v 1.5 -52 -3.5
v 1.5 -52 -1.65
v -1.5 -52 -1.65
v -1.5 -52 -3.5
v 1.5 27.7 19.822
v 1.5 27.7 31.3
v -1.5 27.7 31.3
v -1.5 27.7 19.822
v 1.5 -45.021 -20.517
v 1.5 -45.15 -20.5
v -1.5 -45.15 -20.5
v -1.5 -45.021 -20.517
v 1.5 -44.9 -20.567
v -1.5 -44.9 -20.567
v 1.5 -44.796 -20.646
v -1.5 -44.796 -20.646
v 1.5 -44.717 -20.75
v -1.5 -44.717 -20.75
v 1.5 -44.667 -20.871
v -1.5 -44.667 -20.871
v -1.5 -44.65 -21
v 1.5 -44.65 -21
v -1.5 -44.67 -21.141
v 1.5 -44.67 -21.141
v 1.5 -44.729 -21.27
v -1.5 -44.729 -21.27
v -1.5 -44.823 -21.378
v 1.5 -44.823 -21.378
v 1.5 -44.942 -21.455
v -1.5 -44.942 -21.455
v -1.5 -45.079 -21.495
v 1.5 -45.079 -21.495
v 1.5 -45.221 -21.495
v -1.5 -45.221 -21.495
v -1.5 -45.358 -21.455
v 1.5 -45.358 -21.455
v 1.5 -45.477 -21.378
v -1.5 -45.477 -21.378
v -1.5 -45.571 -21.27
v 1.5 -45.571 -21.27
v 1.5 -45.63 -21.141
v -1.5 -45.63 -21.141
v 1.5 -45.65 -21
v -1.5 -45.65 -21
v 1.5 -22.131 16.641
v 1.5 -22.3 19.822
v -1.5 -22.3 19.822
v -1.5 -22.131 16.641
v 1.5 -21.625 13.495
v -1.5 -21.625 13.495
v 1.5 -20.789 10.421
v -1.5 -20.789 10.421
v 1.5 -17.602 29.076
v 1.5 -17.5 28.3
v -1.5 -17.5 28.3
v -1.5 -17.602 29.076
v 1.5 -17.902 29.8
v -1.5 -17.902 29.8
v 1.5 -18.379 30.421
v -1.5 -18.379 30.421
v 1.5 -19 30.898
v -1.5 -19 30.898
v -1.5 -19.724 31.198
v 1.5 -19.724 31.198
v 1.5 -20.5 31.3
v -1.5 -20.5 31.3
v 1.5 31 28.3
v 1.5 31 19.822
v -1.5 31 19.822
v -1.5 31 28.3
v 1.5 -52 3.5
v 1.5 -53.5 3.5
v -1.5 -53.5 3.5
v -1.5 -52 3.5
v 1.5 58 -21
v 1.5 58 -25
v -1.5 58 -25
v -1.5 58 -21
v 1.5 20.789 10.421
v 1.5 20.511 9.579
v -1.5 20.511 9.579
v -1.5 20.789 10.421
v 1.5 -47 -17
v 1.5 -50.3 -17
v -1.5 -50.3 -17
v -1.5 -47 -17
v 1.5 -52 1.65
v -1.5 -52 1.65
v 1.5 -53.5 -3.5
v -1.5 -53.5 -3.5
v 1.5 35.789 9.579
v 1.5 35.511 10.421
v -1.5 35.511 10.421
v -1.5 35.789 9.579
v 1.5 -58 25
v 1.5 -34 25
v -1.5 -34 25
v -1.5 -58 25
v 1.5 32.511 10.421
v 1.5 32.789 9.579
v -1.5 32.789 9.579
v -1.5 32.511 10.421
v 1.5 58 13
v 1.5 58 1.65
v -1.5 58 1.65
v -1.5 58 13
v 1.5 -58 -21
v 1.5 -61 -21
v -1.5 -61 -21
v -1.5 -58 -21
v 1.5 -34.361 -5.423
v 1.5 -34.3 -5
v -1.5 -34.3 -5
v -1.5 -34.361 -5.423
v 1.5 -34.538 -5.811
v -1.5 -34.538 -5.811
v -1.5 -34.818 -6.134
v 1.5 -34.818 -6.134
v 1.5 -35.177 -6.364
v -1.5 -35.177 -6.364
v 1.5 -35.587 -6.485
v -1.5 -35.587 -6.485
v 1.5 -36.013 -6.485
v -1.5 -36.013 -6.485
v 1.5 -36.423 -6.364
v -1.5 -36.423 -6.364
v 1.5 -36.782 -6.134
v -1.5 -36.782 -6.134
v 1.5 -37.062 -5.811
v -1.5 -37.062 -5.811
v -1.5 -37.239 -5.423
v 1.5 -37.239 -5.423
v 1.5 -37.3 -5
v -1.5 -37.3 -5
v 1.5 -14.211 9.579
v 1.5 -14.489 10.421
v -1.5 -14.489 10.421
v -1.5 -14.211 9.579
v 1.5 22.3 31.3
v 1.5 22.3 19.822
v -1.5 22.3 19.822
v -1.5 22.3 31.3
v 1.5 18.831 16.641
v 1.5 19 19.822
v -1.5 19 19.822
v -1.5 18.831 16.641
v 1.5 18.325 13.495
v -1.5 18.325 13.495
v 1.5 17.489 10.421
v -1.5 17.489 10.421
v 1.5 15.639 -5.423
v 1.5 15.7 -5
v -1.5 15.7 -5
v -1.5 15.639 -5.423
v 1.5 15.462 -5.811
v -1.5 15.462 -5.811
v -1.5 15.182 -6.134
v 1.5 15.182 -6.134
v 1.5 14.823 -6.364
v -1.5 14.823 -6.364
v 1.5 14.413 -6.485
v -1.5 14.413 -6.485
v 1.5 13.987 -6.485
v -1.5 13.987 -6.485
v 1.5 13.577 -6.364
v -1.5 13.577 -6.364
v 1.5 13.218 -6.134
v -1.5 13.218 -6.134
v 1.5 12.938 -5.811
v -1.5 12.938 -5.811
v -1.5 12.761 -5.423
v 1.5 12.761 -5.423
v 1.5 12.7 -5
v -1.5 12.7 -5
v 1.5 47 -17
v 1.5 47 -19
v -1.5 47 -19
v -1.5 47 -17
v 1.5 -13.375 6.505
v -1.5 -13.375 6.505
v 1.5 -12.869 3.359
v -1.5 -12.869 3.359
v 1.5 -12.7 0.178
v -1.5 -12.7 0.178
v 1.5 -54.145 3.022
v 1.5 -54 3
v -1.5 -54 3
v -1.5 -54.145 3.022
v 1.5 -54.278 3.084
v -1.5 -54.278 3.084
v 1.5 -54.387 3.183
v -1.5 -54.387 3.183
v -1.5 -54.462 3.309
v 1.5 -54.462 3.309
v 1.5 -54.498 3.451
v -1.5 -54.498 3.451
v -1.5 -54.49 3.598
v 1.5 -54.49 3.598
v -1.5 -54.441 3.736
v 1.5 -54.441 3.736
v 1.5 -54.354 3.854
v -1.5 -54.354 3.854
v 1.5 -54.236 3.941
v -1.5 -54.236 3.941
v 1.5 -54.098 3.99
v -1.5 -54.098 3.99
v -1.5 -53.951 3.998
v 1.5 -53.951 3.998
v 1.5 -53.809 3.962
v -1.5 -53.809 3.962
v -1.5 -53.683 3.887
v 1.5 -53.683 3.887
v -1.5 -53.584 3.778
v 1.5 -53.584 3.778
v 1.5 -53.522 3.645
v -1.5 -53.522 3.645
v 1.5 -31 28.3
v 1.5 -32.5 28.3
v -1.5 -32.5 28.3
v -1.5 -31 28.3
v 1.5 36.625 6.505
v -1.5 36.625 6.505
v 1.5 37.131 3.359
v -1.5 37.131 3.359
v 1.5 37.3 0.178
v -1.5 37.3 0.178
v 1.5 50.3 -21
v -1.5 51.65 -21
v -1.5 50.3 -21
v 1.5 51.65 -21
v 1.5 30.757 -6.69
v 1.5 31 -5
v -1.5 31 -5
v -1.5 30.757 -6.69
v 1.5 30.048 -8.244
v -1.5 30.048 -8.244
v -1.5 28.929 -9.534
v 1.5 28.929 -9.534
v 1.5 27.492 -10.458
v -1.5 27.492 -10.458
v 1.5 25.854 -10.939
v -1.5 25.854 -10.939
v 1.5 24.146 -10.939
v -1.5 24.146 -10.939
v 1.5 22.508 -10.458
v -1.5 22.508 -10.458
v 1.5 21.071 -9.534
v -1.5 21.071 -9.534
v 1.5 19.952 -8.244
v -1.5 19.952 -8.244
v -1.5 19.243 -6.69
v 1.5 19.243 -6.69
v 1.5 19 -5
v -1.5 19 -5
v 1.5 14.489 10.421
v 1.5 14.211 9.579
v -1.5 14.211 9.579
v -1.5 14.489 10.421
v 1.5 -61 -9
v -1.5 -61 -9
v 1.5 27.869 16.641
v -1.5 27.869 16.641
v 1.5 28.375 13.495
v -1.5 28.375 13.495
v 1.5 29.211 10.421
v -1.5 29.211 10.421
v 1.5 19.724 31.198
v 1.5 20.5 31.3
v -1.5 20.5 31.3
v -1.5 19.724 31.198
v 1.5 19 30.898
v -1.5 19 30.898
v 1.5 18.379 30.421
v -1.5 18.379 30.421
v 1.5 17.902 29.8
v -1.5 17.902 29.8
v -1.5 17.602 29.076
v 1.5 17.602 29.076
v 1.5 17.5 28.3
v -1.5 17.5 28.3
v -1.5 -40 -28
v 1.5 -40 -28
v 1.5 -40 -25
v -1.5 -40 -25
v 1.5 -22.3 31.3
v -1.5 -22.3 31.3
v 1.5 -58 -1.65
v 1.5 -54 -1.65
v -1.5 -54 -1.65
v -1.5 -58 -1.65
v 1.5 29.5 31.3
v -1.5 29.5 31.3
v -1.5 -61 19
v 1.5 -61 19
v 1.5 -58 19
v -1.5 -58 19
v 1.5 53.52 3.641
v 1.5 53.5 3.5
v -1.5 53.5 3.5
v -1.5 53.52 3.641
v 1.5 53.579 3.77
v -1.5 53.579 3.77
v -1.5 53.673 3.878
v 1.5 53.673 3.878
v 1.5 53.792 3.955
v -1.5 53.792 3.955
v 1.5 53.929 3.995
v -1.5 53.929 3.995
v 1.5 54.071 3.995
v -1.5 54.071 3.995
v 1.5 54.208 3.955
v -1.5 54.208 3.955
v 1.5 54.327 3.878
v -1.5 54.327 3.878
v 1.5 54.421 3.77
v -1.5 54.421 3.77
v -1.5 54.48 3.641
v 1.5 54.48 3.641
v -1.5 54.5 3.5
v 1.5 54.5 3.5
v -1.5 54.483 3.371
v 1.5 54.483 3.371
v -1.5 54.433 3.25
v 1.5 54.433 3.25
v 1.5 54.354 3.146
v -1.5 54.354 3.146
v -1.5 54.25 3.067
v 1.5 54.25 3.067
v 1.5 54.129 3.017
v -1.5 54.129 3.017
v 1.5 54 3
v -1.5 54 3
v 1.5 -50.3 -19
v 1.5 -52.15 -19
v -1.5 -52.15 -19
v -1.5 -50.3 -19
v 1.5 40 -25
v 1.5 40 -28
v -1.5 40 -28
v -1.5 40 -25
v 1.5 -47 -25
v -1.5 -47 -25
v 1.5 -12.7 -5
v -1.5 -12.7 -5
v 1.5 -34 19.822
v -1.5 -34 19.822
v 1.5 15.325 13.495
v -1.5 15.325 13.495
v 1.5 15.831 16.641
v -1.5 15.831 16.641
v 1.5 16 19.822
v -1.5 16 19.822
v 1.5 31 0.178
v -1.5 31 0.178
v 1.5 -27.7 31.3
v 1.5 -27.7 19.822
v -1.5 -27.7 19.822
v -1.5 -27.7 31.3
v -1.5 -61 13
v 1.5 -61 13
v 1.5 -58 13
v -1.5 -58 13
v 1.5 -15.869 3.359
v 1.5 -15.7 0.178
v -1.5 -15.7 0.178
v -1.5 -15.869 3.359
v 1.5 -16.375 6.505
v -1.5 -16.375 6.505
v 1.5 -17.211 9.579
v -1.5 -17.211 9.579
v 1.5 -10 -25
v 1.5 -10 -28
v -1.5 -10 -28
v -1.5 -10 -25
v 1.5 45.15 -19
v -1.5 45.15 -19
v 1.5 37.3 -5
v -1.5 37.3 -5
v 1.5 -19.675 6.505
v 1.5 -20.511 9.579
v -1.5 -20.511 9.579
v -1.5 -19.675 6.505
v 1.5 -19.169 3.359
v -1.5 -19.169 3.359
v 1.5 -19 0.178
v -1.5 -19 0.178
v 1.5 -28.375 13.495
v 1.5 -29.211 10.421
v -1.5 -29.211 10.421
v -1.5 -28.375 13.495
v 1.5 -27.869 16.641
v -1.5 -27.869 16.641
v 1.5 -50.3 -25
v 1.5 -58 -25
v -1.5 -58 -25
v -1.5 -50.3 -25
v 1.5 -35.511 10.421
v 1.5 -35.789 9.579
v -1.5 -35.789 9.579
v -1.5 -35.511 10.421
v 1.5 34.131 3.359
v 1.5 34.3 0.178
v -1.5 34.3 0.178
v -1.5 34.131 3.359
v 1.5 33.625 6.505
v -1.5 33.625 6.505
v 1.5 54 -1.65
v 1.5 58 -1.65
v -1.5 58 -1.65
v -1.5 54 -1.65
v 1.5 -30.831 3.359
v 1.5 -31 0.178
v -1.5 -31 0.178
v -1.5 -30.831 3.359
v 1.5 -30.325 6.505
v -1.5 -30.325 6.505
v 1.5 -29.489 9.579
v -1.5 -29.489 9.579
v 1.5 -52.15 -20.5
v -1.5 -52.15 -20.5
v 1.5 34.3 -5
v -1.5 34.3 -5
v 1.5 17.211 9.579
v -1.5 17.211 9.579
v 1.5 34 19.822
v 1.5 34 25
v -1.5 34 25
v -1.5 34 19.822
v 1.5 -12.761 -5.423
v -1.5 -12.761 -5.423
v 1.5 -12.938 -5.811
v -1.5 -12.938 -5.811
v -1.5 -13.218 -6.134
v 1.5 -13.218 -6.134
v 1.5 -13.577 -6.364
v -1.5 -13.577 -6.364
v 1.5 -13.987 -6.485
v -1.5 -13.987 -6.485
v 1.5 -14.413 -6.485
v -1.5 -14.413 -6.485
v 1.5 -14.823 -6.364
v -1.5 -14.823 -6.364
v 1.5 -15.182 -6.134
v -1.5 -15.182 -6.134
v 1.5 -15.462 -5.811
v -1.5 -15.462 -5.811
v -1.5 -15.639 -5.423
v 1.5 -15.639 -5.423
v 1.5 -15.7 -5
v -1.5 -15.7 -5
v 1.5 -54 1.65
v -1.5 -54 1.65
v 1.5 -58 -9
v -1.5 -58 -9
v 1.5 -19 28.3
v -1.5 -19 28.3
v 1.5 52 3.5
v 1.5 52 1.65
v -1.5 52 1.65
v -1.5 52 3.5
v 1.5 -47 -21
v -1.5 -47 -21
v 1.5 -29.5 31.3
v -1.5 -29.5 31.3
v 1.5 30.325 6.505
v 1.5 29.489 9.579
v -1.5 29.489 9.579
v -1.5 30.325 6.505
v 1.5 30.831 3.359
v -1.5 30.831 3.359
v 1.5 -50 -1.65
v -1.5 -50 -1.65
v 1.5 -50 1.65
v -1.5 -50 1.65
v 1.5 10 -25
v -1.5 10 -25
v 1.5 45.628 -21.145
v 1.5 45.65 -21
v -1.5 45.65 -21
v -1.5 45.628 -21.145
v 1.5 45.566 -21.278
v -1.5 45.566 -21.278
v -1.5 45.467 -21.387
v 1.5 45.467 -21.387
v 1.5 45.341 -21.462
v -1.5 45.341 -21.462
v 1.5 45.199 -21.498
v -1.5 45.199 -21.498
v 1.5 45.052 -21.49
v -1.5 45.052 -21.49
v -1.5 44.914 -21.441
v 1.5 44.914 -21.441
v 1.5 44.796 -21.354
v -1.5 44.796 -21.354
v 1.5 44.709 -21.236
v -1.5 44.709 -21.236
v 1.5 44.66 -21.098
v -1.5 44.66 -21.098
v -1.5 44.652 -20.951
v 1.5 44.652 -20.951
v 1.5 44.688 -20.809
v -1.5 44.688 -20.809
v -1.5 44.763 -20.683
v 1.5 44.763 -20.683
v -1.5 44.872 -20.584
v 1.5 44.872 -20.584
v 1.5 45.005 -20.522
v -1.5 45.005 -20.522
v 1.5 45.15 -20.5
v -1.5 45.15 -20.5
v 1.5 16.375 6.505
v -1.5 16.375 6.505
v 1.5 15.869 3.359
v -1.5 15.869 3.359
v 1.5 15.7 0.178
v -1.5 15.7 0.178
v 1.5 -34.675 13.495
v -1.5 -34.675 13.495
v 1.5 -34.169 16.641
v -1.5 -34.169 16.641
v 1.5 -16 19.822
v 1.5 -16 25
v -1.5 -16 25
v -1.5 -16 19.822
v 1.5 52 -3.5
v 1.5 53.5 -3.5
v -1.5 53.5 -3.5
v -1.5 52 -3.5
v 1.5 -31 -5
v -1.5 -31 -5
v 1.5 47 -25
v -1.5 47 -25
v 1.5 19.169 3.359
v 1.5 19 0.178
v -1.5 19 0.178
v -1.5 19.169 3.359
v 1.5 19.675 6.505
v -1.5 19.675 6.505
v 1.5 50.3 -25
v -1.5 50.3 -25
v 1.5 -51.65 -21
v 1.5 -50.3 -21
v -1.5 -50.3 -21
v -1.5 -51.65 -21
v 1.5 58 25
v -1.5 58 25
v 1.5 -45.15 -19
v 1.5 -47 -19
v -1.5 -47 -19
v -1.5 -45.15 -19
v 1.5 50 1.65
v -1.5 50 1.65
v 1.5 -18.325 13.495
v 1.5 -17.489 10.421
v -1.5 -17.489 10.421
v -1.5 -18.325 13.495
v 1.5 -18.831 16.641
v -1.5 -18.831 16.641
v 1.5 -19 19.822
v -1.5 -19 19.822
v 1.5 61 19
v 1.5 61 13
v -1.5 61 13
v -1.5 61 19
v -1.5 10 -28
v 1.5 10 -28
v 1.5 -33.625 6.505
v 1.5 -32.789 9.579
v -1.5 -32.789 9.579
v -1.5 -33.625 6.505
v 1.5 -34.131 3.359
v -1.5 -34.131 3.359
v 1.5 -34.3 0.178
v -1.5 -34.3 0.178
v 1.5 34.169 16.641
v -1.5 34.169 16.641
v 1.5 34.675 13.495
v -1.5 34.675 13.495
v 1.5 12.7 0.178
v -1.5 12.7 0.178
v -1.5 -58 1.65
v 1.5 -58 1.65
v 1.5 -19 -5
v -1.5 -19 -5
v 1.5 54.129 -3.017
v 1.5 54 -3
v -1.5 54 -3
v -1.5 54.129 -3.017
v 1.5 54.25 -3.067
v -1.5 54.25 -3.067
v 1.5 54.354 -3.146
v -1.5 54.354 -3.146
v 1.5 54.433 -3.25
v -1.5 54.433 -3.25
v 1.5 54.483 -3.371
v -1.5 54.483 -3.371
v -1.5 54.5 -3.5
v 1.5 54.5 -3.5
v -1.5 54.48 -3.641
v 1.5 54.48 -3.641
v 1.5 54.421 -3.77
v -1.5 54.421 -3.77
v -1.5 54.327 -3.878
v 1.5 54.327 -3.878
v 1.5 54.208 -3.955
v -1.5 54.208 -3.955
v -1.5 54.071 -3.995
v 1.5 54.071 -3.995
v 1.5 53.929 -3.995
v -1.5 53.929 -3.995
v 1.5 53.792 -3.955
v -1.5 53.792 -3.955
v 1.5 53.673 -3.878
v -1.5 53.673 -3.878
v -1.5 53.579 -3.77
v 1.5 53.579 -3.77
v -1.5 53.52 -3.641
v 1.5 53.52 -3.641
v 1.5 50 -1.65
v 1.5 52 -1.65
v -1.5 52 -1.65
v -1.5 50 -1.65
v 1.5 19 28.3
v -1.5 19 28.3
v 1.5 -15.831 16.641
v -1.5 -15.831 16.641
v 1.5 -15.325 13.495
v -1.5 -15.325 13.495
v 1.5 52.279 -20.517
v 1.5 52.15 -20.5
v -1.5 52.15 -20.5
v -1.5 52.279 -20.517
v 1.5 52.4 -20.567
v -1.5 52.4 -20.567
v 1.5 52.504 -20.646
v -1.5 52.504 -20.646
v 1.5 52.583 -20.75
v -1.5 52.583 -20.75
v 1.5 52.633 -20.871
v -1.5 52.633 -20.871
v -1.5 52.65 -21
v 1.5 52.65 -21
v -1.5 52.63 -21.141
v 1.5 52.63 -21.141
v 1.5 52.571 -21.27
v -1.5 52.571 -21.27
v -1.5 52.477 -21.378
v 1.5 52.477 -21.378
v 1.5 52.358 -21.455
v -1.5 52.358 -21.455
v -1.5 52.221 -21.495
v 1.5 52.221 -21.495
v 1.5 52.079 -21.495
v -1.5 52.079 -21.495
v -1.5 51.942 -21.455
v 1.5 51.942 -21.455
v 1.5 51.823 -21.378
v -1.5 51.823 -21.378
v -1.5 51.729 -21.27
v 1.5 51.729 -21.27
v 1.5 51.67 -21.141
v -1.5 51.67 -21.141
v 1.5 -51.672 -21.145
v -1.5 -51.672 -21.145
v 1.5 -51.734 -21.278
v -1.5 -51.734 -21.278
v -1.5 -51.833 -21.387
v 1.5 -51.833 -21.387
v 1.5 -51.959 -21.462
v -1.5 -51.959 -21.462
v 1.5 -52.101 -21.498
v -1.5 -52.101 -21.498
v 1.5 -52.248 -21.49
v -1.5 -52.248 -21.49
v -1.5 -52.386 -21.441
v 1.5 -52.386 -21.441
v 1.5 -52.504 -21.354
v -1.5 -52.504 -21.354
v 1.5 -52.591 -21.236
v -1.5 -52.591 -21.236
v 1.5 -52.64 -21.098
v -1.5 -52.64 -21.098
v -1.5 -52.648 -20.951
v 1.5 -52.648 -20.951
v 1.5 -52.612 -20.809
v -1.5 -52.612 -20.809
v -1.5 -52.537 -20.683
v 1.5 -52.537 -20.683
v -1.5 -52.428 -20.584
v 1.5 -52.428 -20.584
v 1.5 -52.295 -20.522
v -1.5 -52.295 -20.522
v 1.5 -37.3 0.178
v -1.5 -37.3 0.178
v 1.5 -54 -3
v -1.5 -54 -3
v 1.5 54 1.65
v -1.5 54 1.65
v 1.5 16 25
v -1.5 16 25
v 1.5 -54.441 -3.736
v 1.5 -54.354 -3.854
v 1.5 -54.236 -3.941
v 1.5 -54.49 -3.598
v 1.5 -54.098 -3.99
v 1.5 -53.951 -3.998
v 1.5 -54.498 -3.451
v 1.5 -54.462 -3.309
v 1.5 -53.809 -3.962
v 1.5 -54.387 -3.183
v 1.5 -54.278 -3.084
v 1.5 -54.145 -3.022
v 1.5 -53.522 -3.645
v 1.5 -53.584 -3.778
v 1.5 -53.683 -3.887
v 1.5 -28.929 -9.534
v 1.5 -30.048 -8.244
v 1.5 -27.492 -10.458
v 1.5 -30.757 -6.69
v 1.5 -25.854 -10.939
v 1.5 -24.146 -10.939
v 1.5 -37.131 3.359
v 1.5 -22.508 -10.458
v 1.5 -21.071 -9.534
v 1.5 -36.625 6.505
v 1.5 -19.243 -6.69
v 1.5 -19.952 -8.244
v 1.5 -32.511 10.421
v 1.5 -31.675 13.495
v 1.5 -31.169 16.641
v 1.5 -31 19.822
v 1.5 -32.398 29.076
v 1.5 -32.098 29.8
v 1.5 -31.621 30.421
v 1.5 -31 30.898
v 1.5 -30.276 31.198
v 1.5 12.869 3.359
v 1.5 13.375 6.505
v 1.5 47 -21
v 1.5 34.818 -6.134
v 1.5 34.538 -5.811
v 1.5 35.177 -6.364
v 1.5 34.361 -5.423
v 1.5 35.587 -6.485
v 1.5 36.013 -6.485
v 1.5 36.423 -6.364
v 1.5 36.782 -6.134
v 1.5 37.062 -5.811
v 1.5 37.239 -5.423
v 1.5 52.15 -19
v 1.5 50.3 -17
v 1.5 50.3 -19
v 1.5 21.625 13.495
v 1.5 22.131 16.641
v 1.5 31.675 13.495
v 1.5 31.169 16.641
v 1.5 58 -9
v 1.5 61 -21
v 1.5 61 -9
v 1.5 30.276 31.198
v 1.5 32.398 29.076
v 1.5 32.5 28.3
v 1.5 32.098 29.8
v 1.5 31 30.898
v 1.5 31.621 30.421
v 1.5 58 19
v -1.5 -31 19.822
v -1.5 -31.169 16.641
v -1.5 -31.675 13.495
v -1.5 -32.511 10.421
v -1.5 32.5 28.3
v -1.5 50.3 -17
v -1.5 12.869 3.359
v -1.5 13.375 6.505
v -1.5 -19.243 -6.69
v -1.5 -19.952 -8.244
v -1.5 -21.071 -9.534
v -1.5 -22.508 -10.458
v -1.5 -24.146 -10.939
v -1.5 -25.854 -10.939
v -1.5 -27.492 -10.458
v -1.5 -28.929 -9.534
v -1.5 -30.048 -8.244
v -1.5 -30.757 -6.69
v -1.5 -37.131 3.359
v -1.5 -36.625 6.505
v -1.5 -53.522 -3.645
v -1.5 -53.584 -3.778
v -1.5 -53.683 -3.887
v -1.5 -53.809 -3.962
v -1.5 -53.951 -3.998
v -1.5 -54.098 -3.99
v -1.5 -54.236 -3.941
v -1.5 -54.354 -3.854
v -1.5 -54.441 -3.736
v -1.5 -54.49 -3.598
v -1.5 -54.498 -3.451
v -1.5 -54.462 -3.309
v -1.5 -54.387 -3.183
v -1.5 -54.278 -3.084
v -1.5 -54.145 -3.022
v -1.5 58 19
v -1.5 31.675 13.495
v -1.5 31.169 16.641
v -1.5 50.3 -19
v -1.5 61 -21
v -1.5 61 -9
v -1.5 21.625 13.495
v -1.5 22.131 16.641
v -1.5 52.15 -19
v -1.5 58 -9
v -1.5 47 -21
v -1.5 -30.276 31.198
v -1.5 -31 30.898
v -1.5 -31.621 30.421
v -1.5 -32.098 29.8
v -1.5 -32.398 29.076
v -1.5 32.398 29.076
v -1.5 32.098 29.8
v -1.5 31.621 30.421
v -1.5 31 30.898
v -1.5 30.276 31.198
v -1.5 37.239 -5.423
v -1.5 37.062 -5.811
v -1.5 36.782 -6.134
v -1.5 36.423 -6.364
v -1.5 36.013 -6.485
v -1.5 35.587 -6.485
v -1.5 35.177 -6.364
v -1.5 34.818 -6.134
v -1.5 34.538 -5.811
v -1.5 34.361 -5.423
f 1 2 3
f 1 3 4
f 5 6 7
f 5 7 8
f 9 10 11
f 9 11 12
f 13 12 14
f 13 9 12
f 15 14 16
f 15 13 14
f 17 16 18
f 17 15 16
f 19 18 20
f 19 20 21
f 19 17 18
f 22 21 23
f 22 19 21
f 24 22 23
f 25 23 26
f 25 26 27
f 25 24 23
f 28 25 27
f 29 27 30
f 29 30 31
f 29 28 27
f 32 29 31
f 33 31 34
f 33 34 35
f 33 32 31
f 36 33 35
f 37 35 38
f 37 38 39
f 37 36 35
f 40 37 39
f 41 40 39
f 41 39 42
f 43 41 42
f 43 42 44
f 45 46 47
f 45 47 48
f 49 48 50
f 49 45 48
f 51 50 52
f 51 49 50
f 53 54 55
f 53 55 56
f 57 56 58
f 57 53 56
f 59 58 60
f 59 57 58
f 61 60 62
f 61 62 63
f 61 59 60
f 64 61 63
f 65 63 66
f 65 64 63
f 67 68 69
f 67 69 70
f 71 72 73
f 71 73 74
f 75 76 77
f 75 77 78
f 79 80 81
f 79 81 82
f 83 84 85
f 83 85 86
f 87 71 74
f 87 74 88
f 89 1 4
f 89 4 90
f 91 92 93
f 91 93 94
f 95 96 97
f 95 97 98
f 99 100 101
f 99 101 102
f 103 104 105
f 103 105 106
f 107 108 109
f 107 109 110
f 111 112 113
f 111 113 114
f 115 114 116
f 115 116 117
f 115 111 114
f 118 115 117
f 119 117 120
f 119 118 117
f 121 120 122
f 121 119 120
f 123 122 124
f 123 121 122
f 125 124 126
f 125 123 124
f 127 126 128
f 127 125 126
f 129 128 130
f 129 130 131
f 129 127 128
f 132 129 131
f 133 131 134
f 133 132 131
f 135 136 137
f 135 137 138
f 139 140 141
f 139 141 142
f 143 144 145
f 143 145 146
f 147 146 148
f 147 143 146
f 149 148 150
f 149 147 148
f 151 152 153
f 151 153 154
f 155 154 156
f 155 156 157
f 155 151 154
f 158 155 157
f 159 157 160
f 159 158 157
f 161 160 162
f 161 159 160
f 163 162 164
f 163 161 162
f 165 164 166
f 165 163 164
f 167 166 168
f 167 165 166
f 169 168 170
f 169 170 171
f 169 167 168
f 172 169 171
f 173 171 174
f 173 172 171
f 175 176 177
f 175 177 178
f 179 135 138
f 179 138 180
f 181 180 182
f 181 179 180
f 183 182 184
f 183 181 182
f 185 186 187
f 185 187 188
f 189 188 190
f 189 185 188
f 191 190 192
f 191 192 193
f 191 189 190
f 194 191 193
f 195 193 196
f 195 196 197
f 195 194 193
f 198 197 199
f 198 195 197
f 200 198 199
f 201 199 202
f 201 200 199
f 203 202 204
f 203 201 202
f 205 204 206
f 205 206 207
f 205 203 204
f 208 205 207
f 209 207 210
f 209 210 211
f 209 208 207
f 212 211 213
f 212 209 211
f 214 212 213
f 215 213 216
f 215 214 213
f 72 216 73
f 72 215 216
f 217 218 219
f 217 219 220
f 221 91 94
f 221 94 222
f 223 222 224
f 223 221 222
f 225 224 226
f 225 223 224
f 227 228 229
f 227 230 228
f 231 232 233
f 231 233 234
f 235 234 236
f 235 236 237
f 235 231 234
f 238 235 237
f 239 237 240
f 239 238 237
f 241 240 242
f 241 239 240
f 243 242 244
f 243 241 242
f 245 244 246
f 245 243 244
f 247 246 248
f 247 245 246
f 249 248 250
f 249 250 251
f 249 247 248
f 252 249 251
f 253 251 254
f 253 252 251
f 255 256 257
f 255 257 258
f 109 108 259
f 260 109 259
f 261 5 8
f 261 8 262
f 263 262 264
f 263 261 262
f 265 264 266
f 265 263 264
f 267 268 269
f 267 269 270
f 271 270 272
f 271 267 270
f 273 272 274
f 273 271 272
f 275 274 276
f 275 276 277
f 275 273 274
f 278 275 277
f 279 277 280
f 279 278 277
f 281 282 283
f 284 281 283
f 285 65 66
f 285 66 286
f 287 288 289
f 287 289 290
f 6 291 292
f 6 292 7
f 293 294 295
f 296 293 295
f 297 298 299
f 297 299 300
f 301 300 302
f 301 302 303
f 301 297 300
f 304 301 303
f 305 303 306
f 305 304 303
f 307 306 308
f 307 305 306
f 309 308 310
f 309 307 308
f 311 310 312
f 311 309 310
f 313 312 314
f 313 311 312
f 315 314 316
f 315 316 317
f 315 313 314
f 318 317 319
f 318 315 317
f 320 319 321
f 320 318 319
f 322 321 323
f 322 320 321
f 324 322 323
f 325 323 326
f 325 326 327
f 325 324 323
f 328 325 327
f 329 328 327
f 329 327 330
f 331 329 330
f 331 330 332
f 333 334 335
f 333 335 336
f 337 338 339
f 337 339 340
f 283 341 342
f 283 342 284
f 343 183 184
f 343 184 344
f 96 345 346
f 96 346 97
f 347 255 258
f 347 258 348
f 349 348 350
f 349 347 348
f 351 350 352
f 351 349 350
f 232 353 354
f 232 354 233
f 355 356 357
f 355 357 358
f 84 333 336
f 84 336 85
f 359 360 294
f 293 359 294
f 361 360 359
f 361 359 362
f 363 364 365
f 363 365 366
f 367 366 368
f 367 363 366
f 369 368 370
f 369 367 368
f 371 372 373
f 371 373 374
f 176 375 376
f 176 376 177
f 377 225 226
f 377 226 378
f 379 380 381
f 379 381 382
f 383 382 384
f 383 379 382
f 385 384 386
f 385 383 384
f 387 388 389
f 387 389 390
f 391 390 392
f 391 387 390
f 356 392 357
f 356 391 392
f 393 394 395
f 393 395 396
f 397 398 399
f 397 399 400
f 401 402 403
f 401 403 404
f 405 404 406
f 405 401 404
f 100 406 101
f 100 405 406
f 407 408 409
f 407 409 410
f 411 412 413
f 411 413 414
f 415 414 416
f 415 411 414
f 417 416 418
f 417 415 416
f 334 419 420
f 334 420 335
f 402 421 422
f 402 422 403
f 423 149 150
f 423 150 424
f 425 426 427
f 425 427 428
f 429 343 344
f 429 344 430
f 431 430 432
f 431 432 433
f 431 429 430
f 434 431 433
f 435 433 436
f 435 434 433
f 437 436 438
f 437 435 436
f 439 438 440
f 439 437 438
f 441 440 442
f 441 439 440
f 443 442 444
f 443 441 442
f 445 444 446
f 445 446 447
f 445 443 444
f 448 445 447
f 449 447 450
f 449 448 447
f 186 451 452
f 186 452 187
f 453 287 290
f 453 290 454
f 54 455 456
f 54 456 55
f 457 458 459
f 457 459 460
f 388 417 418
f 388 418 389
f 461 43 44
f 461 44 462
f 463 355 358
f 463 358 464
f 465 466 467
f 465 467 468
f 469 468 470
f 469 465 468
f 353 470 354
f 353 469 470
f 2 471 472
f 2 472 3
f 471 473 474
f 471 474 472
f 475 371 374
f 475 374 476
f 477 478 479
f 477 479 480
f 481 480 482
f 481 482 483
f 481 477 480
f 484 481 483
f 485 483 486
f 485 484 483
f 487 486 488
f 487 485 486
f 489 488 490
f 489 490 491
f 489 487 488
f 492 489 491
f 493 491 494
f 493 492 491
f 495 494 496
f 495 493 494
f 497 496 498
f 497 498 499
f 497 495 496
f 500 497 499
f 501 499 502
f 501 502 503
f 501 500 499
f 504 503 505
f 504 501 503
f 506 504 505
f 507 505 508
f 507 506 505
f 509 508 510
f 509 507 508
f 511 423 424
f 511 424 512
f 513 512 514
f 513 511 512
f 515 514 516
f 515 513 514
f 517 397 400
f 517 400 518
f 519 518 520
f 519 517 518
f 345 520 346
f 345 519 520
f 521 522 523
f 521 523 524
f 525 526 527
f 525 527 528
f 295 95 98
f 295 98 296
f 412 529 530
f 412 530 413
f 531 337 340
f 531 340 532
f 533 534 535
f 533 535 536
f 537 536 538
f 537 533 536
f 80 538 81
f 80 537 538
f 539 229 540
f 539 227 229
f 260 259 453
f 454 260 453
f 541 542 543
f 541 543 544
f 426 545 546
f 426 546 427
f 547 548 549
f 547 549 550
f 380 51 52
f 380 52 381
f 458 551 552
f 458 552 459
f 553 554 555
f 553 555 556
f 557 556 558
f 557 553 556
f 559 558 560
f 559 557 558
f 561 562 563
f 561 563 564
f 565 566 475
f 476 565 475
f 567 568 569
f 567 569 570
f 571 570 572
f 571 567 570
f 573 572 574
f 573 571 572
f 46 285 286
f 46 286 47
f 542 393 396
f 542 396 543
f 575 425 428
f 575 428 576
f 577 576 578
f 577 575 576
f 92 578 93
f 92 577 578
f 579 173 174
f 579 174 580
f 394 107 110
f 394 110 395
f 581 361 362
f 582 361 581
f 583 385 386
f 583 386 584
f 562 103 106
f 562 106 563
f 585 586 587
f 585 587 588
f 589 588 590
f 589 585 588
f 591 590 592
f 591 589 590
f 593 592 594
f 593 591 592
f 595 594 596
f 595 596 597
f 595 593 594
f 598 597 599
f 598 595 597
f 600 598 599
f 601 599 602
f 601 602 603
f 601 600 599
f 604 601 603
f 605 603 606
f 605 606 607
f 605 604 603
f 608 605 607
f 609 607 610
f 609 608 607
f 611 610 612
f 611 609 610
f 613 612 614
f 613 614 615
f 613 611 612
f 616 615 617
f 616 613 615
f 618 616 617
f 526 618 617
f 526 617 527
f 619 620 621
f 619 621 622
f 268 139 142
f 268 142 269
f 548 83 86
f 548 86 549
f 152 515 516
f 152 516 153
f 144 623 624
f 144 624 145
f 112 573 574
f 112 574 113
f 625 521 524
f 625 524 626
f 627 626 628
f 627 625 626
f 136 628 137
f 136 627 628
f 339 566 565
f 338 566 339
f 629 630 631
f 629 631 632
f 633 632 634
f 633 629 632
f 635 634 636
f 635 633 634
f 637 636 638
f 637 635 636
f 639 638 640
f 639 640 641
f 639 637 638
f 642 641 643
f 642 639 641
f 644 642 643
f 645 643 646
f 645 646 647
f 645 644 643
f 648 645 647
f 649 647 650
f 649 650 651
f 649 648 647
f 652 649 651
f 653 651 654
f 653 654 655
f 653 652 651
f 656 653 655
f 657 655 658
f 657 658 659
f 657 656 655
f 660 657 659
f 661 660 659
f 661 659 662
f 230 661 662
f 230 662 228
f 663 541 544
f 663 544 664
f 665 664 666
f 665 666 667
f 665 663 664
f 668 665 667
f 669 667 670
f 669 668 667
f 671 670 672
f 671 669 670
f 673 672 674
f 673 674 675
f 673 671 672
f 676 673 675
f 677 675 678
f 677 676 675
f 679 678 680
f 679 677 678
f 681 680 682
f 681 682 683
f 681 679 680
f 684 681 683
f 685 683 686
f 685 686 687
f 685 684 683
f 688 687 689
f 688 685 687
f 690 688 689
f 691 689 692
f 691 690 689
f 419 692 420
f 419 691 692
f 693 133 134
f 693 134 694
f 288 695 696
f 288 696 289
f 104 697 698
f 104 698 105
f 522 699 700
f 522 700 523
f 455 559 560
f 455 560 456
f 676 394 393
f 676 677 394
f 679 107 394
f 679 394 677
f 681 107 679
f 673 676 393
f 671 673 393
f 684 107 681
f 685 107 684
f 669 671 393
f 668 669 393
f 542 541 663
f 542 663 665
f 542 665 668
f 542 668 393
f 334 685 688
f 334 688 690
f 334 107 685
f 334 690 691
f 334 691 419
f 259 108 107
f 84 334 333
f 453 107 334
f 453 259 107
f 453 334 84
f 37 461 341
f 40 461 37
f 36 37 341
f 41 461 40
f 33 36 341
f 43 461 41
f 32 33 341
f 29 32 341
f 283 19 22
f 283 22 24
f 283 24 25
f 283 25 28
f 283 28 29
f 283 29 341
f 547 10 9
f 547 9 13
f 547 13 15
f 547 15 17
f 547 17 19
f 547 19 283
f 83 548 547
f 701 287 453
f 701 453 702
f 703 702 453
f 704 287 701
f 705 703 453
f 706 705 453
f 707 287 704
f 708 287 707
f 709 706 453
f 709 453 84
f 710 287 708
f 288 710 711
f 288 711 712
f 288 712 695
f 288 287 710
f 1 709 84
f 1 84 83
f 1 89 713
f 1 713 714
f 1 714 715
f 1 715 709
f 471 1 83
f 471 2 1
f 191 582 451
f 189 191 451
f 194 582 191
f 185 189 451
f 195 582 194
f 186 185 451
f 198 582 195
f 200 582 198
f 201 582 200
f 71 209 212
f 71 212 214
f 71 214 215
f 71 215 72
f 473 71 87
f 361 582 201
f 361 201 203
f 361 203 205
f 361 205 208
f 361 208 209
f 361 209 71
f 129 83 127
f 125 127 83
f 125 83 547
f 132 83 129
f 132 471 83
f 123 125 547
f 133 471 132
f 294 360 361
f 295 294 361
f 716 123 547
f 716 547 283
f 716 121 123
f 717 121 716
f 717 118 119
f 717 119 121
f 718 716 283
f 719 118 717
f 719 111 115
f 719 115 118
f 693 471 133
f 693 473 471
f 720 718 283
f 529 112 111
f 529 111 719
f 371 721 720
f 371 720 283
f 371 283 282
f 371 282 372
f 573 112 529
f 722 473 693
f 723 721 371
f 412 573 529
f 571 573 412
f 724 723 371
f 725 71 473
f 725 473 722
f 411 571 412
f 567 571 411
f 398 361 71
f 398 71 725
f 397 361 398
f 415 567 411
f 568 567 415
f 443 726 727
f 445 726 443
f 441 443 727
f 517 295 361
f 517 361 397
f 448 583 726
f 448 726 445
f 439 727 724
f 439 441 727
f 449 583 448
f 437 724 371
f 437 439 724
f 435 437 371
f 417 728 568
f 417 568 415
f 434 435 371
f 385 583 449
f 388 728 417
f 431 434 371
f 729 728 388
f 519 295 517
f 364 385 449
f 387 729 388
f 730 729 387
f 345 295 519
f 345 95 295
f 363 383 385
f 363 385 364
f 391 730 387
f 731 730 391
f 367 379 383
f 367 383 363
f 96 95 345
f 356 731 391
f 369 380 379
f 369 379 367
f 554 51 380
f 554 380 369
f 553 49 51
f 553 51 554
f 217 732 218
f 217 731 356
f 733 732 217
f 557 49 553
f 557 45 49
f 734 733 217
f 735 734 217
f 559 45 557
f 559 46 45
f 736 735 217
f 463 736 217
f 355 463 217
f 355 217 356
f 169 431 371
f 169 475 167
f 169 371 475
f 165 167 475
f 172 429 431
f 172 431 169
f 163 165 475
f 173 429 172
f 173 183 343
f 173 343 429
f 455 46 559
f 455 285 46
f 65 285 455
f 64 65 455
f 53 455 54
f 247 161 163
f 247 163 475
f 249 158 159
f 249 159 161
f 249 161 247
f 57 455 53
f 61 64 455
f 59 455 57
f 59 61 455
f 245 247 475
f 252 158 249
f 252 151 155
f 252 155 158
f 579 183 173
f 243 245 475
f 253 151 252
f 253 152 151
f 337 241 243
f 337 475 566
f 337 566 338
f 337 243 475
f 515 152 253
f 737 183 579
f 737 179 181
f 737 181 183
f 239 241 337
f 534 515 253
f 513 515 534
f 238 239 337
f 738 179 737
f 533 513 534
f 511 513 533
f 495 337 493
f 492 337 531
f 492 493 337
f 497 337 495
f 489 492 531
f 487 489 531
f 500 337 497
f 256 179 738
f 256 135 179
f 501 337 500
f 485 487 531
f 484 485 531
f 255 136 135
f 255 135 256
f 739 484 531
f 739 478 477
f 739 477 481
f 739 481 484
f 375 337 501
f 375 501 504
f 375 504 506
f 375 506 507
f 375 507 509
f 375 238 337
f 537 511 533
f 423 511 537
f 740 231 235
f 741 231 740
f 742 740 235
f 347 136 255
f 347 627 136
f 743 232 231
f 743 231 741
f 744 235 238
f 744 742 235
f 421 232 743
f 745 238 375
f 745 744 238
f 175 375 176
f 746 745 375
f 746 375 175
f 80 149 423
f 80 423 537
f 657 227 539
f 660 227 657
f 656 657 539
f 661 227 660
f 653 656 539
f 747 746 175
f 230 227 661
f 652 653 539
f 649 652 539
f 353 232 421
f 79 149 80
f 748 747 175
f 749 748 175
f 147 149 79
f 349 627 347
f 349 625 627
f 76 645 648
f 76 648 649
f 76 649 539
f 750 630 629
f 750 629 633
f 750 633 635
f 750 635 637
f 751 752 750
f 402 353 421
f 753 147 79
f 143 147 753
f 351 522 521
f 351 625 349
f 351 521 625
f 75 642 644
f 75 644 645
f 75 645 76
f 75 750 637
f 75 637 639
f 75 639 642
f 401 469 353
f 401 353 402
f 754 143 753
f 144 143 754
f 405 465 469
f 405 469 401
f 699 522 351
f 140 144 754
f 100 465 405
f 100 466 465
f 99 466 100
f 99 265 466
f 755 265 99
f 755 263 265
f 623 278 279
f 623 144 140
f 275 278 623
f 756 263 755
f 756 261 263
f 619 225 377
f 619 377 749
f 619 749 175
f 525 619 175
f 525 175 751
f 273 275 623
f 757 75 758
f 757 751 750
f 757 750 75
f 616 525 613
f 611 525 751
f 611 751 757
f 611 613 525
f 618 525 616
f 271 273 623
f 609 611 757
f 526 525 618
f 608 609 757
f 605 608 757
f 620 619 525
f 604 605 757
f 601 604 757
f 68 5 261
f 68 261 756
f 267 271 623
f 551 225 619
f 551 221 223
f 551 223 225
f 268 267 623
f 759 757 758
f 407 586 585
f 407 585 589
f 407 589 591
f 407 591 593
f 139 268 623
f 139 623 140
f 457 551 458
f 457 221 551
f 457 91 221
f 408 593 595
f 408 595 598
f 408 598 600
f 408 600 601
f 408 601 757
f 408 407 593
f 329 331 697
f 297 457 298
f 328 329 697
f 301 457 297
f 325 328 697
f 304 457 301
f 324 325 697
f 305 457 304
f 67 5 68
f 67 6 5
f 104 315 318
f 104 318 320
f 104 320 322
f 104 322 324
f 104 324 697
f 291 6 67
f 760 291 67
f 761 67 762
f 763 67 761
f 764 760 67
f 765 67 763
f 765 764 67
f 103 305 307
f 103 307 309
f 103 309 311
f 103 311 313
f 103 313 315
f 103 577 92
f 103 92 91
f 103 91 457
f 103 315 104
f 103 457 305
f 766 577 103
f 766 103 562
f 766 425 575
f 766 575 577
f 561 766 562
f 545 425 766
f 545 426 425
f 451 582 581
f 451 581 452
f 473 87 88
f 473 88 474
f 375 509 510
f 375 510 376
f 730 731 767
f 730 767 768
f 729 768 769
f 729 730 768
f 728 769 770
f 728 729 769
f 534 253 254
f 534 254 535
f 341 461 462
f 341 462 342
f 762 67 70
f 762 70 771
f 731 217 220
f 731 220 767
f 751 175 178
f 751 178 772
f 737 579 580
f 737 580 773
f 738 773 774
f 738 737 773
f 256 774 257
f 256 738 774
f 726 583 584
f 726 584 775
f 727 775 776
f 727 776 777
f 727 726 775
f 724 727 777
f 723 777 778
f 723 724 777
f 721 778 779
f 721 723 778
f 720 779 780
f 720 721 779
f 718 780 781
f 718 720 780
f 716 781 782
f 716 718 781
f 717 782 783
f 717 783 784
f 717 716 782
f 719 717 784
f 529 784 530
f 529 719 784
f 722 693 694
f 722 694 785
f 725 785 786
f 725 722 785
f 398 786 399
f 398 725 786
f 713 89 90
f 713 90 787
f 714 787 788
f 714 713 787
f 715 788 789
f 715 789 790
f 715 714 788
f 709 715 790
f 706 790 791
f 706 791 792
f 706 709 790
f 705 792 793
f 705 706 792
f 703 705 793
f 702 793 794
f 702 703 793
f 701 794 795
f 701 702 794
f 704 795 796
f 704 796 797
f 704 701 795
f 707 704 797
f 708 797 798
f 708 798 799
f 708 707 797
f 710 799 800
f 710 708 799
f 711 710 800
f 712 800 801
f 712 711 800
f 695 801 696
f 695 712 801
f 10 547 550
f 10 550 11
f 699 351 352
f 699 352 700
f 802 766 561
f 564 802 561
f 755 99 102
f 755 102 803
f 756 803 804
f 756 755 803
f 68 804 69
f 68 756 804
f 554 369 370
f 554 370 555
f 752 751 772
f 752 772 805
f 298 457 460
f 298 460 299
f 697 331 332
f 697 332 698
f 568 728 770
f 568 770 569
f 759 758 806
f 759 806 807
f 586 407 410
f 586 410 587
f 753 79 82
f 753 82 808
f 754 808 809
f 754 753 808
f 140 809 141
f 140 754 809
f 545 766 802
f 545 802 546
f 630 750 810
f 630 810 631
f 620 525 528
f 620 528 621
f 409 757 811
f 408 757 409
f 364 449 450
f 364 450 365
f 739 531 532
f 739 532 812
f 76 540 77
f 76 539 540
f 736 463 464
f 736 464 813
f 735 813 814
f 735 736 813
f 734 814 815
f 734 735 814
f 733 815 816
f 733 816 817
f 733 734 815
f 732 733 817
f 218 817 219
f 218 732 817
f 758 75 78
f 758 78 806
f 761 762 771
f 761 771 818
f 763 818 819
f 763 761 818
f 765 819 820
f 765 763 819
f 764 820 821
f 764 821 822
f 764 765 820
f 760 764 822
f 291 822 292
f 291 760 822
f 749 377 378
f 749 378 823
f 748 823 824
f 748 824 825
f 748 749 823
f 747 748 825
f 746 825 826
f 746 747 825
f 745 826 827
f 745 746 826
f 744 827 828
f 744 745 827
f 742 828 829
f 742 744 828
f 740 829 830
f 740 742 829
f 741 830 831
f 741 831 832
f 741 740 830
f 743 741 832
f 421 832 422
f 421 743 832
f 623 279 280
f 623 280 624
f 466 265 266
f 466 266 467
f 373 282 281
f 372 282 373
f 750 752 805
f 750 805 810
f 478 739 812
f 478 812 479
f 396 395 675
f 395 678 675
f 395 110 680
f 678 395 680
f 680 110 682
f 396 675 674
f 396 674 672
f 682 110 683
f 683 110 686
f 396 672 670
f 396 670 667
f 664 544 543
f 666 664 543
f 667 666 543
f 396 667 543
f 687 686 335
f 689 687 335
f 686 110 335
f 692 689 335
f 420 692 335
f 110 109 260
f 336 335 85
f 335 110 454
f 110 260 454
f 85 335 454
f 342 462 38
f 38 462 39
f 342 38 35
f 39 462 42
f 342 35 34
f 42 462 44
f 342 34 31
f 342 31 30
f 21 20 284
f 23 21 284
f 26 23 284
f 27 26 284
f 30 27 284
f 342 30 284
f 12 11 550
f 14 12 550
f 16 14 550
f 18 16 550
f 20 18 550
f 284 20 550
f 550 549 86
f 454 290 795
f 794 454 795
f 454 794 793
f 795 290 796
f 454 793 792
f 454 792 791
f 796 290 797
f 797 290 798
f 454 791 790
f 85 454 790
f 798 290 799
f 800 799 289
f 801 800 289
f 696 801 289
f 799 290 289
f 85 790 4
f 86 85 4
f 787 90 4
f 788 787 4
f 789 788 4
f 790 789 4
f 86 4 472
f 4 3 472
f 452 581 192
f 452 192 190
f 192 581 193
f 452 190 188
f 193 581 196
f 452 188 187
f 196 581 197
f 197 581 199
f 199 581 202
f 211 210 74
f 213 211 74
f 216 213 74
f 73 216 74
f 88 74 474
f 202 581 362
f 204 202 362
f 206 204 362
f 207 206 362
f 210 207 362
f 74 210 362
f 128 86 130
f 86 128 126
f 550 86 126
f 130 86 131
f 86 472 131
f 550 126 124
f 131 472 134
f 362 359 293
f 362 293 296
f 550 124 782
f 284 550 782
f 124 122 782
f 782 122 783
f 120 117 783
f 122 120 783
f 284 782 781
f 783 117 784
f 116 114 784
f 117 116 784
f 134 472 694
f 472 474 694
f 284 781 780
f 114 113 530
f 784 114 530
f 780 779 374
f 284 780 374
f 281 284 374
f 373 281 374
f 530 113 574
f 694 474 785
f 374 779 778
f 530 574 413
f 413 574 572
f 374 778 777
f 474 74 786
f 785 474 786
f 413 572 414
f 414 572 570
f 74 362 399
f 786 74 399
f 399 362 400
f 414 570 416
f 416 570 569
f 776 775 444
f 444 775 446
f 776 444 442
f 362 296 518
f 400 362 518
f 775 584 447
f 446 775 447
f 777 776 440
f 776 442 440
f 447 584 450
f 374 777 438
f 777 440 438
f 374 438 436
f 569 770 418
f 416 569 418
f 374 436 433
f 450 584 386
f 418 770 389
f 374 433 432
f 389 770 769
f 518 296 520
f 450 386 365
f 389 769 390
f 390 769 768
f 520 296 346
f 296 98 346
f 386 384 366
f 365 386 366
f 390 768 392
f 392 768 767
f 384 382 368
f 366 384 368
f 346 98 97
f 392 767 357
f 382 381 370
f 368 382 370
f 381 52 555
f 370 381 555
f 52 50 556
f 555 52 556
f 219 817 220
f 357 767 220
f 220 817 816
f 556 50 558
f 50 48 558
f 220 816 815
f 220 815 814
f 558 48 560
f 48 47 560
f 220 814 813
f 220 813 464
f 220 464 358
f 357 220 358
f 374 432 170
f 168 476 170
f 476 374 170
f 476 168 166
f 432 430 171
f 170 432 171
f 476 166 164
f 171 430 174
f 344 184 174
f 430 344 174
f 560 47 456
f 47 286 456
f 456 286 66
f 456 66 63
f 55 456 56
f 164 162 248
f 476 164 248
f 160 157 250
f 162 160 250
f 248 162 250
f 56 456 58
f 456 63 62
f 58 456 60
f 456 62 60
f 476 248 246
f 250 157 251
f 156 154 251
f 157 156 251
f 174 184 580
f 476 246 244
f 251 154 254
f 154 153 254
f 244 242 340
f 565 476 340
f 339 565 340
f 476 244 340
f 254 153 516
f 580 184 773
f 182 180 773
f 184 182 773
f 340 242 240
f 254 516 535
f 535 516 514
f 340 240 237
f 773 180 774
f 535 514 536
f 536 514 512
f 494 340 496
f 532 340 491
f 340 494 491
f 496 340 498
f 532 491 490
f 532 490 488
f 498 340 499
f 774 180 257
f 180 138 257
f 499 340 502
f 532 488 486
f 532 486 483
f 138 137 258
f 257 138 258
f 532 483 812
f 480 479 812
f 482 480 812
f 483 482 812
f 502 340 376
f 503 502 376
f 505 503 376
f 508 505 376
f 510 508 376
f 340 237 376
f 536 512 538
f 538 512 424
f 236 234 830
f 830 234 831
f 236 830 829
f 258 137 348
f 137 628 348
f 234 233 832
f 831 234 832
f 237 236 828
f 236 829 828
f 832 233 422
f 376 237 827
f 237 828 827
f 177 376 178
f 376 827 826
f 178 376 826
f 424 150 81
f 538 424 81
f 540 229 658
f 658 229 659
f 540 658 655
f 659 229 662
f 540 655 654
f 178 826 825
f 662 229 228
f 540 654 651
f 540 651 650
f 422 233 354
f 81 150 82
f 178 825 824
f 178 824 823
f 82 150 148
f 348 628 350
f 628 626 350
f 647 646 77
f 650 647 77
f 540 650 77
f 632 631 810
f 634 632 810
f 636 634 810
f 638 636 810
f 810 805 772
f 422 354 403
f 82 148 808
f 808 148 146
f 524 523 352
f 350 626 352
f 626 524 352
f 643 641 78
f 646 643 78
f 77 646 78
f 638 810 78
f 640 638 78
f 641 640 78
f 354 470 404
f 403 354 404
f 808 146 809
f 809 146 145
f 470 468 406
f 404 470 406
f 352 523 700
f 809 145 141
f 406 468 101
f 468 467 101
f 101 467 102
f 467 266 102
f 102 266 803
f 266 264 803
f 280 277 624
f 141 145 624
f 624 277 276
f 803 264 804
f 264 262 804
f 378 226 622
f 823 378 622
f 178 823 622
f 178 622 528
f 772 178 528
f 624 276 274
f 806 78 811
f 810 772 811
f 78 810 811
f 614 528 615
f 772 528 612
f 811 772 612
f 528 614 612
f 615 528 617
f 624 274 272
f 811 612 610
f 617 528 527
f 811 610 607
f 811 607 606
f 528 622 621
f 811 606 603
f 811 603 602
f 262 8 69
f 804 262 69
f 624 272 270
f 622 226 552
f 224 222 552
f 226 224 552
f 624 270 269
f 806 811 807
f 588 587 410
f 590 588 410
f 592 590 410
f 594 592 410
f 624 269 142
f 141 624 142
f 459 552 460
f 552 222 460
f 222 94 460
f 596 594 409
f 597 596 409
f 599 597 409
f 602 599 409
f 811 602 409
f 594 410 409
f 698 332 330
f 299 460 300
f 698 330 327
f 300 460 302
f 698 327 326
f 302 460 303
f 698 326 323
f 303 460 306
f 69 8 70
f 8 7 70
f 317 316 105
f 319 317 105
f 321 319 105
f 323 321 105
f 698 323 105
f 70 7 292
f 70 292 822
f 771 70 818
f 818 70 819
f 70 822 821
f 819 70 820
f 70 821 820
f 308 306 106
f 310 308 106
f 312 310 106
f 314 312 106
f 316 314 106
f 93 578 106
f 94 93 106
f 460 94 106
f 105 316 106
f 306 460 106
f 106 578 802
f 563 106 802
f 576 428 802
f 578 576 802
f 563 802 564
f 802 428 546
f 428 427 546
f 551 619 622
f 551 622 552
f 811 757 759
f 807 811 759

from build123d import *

# Parameters (mm, degrees)
F0_W     = 3
F0_H     = 6
F0_H_2   = 12
F0_W_2   = 30
F0_H_3   = 3
F1_DEPTH = 1.5


# Not quite as in the source:
# - a feature names something its author has since deleted; it is built from what else it names


with BuildPart() as f1:
    # F0 (on Right) → F1 (new body, symmetric)
    with BuildSketch(Plane.YZ):
        with BuildLine():
            Line((50.3, -25), (58, -25))
            Line((58, -25), (58, -21))
            Line((58, -21), (58, -9))
            Line((58, -9), (58, -1.65))
            Line((58, -1.65), (54, -1.65))
            Line((54, -1.65), (54, -3))
            ThreePointArc((54, -3), (54.3535533906, -3.1464466094), (54.5, -3.5))
            ThreePointArc((54.5, -3.5), (54, -4), (53.5, -3.5))
            Line((53.5, -3.5), (52, -3.5))
            Line((52, -3.5), (52, -1.65))
            Line((52, -1.65), (50, -1.65))
            Line((50, -1.65), (50, 1.65))
            Line((50, 1.65), (52, 1.65))
            Line((52, 1.65), (52, 3.5))
            Line((52, 3.5), (53.5, 3.5))
            ThreePointArc((53.5, 3.5), (54, 4), (54.5, 3.5))
            ThreePointArc((54.5, 3.5), (54.3535533906, 3.1464466094), (54, 3))
            Line((54, 3), (54, 1.65))
            Line((54, 1.65), (58, 1.65))
            Line((58, 1.65), (58, 13))
            Line((58, 13), (58, 19))
            Line((58, 19), (58, 25))
            Line((58, 25), (34, 25))
            Line((34, 25), (34, 19.8221099082))
            ThreePointArc((34, 19.8221099082), (34.3801942596, 15.0611112835), (35.5111405269, 10.4207862821))
            Line((35.5111405269, 10.4207862821), (35.7888594731, 9.5792137179))
            ThreePointArc((35.7888594731, 9.5792137179), (36.9198057404, 4.9388887165), (37.3, 0.1778900918))
            Line((37.3, 0.1778900918), (37.3, -5))
            ThreePointArc((37.3, -5), (35.8, -6.5), (34.3, -5))
            Line((34.3, -5), (34.3, 0.1778900918))
            ThreePointArc((34.3, 0.1778900918), (33.9198057404, 4.9388887165), (32.7888594731, 9.5792137179))
            Line((32.7888594731, 9.5792137179), (32.5111405269, 10.4207862821))
            ThreePointArc((32.5111405269, 10.4207862821), (31.3801942596, 15.0611112835), (31, 19.8221099082))
            Line((31, 19.8221099082), (31, 25))
            Line((31, 25), (27.7, 25))
            Line((27.7, 25), (27.7, 19.8221099082))
            ThreePointArc((27.7, 19.8221099082), (28.0801942596, 15.0611112835), (29.2111405269, 10.4207862821))
            Line((29.2111405269, 10.4207862821), (29.4888594731, 9.5792137179))
            ThreePointArc((29.4888594731, 9.5792137179), (30.6198057404, 4.9388887165), (31, 0.1778900918))
            Line((31, 0.1778900918), (31, -5))
            ThreePointArc((31, -5), (25, -11), (19, -5))
            Line((19, -5), (19, 0.1778900918))
            ThreePointArc((19, 0.1778900918), (19.3801942596, 4.9388887165), (20.5111405269, 9.5792137179))
            Line((20.5111405269, 9.5792137179), (20.7888594731, 10.4207862821))
            ThreePointArc((20.7888594731, 10.4207862821), (21.9198057404, 15.0611112835), (22.3, 19.8221099082))
            Line((22.3, 19.8221099082), (22.3, 25))
            Line((22.3, 25), (19, 25))
            Line((19, 25), (19, 19.8221099082))
            ThreePointArc((19, 19.8221099082), (18.6198057404, 15.0611112835), (17.4888594731, 10.4207862821))
            Line((17.4888594731, 10.4207862821), (17.2111405269, 9.5792137179))
            ThreePointArc((17.2111405269, 9.5792137179), (16.0801942596, 4.9388887165), (15.7, 0.1778900918))
            Line((15.7, 0.1778900918), (15.7, -5))
            ThreePointArc((15.7, -5), (14.2, -6.5), (12.7, -5))
            Line((12.7, -5), (12.7, 0.1778900918))
            ThreePointArc((12.7, 0.1778900918), (13.0801942596, 4.9388887165), (14.2111405269, 9.5792137179))
            Line((14.2111405269, 9.5792137179), (14.4888594731, 10.4207862821))
            ThreePointArc((14.4888594731, 10.4207862821), (15.6198057404, 15.0611112835), (16, 19.8221099082))
            Line((16, 19.8221099082), (16, 25))
            Line((16, 25), (-16, 25))
            Line((-16, 25), (-16, 19.8221099082))
            ThreePointArc((-16, 19.8221099082), (-15.6198057404, 15.0611112835), (-14.4888594731, 10.4207862821))
            Line((-14.4888594731, 10.4207862821), (-14.2111405269, 9.5792137179))
            ThreePointArc((-14.2111405269, 9.5792137179), (-13.0801942596, 4.9388887165), (-12.7, 0.1778900918))
            Line((-12.7, 0.1778900918), (-12.7, -5))
            ThreePointArc((-12.7, -5), (-14.2, -6.5), (-15.7, -5))
            Line((-15.7, -5), (-15.7, 0.1778900918))
            ThreePointArc((-15.7, 0.1778900918), (-16.0801942596, 4.9388887165), (-17.2111405269, 9.5792137179))
            Line((-17.2111405269, 9.5792137179), (-17.4888594731, 10.4207862821))
            ThreePointArc((-17.4888594731, 10.4207862821), (-18.6198057404, 15.0611112835), (-19, 19.8221099082))
            Line((-19, 19.8221099082), (-19, 25))
            Line((-19, 25), (-22.3, 25))
            Line((-22.3, 25), (-22.3, 19.8221099082))
            ThreePointArc((-22.3, 19.8221099082), (-21.9198057404, 15.0611112835), (-20.7888594731, 10.4207862821))
            Line((-20.7888594731, 10.4207862821), (-20.5111405269, 9.5792137179))
            ThreePointArc((-20.5111405269, 9.5792137179), (-19.3801942596, 4.9388887165), (-19, 0.1778900918))
            Line((-19, 0.1778900918), (-19, -5))
            ThreePointArc((-19, -5), (-25, -11), (-31, -5))
            Line((-31, -5), (-31, 0.1778900918))
            ThreePointArc((-31, 0.1778900918), (-30.6198057404, 4.9388887165), (-29.4888594731, 9.5792137179))
            Line((-29.4888594731, 9.5792137179), (-29.2111405269, 10.4207862821))
            ThreePointArc((-29.2111405269, 10.4207862821), (-28.0801942596, 15.0611112835), (-27.7, 19.8221099082))
            Line((-27.7, 19.8221099082), (-27.7, 25))
            Line((-27.7, 25), (-31, 25))
            Line((-31, 25), (-31, 19.8221099082))
            ThreePointArc((-31, 19.8221099082), (-31.3801942596, 15.0611112835), (-32.5111405269, 10.4207862821))
            Line((-32.5111405269, 10.4207862821), (-32.7888594731, 9.5792137179))
            ThreePointArc((-32.7888594731, 9.5792137179), (-33.9198057404, 4.9388887165), (-34.3, 0.1778900918))
            Line((-34.3, 0.1778900918), (-34.3, -5))
            ThreePointArc((-34.3, -5), (-35.8, -6.5), (-37.3, -5))
            Line((-37.3, -5), (-37.3, 0.1778900918))
            ThreePointArc((-37.3, 0.1778900918), (-36.9198057404, 4.9388887165), (-35.7888594731, 9.5792137179))
            Line((-35.7888594731, 9.5792137179), (-35.5111405269, 10.4207862821))
            ThreePointArc((-35.5111405269, 10.4207862821), (-34.3801942596, 15.0611112835), (-34, 19.8221099082))
            Line((-34, 19.8221099082), (-34, 25))
            Line((-34, 25), (-58, 25))
            Line((-58, 25), (-58, 19))
            Line((-58, 19), (-58, 13))
            Line((-58, 13), (-58, 1.65))
            Line((-58, 1.65), (-54, 1.65))
            Line((-54, 1.65), (-54, 3))
            ThreePointArc((-54, 3), (-54.3535533906, 3.8535533906), (-53.5, 3.5))
            Line((-53.5, 3.5), (-52, 3.5))
            Line((-52, 3.5), (-52, 1.65))
            Line((-52, 1.65), (-50, 1.65))
            Line((-50, 1.65), (-50, -1.65))
            Line((-50, -1.65), (-52, -1.65))
            Line((-52, -1.65), (-52, -3.5))
            Line((-52, -3.5), (-53.5, -3.5))
            ThreePointArc((-53.5, -3.5), (-54.3535533906, -3.8535533906), (-54, -3))
            Line((-54, -3), (-54, -1.65))
            Line((-54, -1.65), (-58, -1.65))
            Line((-58, -1.65), (-58, -9))
            Line((-58, -9), (-58, -21))
            Line((-58, -21), (-58, -25))
            Line((-58, -25), (-50.3, -25))
            Line((-50.3, -25), (-50.3, -21))
            Line((-50.3, -21), (-51.65, -21))
            ThreePointArc((-51.65, -21), (-52.5035533906, -21.3535533906), (-52.15, -20.5))
            Line((-52.15, -20.5), (-52.15, -19))
            Line((-52.15, -19), (-50.3, -19))
            Line((-50.3, -19), (-50.3, -17))
            Line((-50.3, -17), (-47, -17))
            Line((-47, -17), (-47, -19))
            Line((-47, -19), (-45.15, -19))
            Line((-45.15, -19), (-45.15, -20.5))
            ThreePointArc((-45.15, -20.5), (-44.7964466094, -20.6464466094), (-44.65, -21))
            ThreePointArc((-44.65, -21), (-45.15, -21.5), (-45.65, -21))
            Line((-45.65, -21), (-47, -21))
            Line((-47, -21), (-47, -25))
            Line((-47, -25), (-40, -25))
            Line((-40, -25), (-10, -25))
            Line((-10, -25), (10, -25))
            Line((10, -25), (40, -25))
            Line((40, -25), (47, -25))
            Line((47, -25), (47, -21))
            Line((47, -21), (45.65, -21))
            ThreePointArc((45.65, -21), (44.7964466094, -21.3535533906), (45.15, -20.5))
            Line((45.15, -20.5), (45.15, -19))
            Line((45.15, -19), (47, -19))
            Line((47, -19), (47, -17))
            Line((47, -17), (50.3, -17))
            Line((50.3, -17), (50.3, -19))
            Line((50.3, -19), (52.15, -19))
            Line((52.15, -19), (52.15, -20.5))
            ThreePointArc((52.15, -20.5), (52.5035533906, -20.6464466094), (52.65, -21))
            ThreePointArc((52.65, -21), (52.15, -21.5), (51.65, -21))
            Line((51.65, -21), (50.3, -21))
            Line((50.3, -21), (50.3, -25))
        make_face()
        with Locations((-59.5, 16)):
            Rectangle(F0_W, F0_H)
        with Locations((-59.5, -15)):
            Rectangle(F0_W, F0_H_2)
        with Locations((59.5, 16)):
            Rectangle(F0_W, F0_H)
        with Locations((59.5, -15)):
            Rectangle(F0_W, F0_H_2)
        with Locations((25, -26.5)):
            Rectangle(F0_W_2, F0_H_3)
        with Locations((-25, -26.5)):
            Rectangle(F0_W_2, F0_H_3)
        with BuildLine():
            Line((-31, 28.3), (-31, 25))
            Line((-31, 25), (-27.7, 25))
            Line((-27.7, 25), (-27.7, 31.3))
            Line((-27.7, 31.3), (-29.5, 31.3))
            ThreePointArc((-29.5, 31.3), (-31.6213203436, 30.4213203436), (-32.5, 28.3))
            Line((-32.5, 28.3), (-31, 28.3))
        make_face()
        with BuildLine():
            Line((-22.3, 25), (-19, 25))
            Line((-19, 25), (-19, 28.3))
            Line((-19, 28.3), (-17.5, 28.3))
            ThreePointArc((-17.5, 28.3), (-18.3786796564, 30.4213203436), (-20.5, 31.3))
            Line((-20.5, 31.3), (-22.3, 31.3))
            Line((-22.3, 31.3), (-22.3, 25))
        make_face()
        with BuildLine():
            Line((19, 25), (22.3, 25))
            Line((22.3, 25), (22.3, 31.3))
            Line((22.3, 31.3), (20.5, 31.3))
            ThreePointArc((20.5, 31.3), (18.3786796564, 30.4213203436), (17.5, 28.3))
            Line((17.5, 28.3), (19, 28.3))
            Line((19, 28.3), (19, 25))
        make_face()
        with BuildLine():
            Line((27.7, 25), (31, 25))
            Line((31, 25), (31, 28.3))
            Line((31, 28.3), (32.5, 28.3))
            ThreePointArc((32.5, 28.3), (31.6213203436, 30.4213203436), (29.5, 31.3))
            Line((29.5, 31.3), (27.7, 31.3))
            Line((27.7, 31.3), (27.7, 25))
        make_face()
    extrude(amount=F1_DEPTH, both=True)


solid = f1.part
